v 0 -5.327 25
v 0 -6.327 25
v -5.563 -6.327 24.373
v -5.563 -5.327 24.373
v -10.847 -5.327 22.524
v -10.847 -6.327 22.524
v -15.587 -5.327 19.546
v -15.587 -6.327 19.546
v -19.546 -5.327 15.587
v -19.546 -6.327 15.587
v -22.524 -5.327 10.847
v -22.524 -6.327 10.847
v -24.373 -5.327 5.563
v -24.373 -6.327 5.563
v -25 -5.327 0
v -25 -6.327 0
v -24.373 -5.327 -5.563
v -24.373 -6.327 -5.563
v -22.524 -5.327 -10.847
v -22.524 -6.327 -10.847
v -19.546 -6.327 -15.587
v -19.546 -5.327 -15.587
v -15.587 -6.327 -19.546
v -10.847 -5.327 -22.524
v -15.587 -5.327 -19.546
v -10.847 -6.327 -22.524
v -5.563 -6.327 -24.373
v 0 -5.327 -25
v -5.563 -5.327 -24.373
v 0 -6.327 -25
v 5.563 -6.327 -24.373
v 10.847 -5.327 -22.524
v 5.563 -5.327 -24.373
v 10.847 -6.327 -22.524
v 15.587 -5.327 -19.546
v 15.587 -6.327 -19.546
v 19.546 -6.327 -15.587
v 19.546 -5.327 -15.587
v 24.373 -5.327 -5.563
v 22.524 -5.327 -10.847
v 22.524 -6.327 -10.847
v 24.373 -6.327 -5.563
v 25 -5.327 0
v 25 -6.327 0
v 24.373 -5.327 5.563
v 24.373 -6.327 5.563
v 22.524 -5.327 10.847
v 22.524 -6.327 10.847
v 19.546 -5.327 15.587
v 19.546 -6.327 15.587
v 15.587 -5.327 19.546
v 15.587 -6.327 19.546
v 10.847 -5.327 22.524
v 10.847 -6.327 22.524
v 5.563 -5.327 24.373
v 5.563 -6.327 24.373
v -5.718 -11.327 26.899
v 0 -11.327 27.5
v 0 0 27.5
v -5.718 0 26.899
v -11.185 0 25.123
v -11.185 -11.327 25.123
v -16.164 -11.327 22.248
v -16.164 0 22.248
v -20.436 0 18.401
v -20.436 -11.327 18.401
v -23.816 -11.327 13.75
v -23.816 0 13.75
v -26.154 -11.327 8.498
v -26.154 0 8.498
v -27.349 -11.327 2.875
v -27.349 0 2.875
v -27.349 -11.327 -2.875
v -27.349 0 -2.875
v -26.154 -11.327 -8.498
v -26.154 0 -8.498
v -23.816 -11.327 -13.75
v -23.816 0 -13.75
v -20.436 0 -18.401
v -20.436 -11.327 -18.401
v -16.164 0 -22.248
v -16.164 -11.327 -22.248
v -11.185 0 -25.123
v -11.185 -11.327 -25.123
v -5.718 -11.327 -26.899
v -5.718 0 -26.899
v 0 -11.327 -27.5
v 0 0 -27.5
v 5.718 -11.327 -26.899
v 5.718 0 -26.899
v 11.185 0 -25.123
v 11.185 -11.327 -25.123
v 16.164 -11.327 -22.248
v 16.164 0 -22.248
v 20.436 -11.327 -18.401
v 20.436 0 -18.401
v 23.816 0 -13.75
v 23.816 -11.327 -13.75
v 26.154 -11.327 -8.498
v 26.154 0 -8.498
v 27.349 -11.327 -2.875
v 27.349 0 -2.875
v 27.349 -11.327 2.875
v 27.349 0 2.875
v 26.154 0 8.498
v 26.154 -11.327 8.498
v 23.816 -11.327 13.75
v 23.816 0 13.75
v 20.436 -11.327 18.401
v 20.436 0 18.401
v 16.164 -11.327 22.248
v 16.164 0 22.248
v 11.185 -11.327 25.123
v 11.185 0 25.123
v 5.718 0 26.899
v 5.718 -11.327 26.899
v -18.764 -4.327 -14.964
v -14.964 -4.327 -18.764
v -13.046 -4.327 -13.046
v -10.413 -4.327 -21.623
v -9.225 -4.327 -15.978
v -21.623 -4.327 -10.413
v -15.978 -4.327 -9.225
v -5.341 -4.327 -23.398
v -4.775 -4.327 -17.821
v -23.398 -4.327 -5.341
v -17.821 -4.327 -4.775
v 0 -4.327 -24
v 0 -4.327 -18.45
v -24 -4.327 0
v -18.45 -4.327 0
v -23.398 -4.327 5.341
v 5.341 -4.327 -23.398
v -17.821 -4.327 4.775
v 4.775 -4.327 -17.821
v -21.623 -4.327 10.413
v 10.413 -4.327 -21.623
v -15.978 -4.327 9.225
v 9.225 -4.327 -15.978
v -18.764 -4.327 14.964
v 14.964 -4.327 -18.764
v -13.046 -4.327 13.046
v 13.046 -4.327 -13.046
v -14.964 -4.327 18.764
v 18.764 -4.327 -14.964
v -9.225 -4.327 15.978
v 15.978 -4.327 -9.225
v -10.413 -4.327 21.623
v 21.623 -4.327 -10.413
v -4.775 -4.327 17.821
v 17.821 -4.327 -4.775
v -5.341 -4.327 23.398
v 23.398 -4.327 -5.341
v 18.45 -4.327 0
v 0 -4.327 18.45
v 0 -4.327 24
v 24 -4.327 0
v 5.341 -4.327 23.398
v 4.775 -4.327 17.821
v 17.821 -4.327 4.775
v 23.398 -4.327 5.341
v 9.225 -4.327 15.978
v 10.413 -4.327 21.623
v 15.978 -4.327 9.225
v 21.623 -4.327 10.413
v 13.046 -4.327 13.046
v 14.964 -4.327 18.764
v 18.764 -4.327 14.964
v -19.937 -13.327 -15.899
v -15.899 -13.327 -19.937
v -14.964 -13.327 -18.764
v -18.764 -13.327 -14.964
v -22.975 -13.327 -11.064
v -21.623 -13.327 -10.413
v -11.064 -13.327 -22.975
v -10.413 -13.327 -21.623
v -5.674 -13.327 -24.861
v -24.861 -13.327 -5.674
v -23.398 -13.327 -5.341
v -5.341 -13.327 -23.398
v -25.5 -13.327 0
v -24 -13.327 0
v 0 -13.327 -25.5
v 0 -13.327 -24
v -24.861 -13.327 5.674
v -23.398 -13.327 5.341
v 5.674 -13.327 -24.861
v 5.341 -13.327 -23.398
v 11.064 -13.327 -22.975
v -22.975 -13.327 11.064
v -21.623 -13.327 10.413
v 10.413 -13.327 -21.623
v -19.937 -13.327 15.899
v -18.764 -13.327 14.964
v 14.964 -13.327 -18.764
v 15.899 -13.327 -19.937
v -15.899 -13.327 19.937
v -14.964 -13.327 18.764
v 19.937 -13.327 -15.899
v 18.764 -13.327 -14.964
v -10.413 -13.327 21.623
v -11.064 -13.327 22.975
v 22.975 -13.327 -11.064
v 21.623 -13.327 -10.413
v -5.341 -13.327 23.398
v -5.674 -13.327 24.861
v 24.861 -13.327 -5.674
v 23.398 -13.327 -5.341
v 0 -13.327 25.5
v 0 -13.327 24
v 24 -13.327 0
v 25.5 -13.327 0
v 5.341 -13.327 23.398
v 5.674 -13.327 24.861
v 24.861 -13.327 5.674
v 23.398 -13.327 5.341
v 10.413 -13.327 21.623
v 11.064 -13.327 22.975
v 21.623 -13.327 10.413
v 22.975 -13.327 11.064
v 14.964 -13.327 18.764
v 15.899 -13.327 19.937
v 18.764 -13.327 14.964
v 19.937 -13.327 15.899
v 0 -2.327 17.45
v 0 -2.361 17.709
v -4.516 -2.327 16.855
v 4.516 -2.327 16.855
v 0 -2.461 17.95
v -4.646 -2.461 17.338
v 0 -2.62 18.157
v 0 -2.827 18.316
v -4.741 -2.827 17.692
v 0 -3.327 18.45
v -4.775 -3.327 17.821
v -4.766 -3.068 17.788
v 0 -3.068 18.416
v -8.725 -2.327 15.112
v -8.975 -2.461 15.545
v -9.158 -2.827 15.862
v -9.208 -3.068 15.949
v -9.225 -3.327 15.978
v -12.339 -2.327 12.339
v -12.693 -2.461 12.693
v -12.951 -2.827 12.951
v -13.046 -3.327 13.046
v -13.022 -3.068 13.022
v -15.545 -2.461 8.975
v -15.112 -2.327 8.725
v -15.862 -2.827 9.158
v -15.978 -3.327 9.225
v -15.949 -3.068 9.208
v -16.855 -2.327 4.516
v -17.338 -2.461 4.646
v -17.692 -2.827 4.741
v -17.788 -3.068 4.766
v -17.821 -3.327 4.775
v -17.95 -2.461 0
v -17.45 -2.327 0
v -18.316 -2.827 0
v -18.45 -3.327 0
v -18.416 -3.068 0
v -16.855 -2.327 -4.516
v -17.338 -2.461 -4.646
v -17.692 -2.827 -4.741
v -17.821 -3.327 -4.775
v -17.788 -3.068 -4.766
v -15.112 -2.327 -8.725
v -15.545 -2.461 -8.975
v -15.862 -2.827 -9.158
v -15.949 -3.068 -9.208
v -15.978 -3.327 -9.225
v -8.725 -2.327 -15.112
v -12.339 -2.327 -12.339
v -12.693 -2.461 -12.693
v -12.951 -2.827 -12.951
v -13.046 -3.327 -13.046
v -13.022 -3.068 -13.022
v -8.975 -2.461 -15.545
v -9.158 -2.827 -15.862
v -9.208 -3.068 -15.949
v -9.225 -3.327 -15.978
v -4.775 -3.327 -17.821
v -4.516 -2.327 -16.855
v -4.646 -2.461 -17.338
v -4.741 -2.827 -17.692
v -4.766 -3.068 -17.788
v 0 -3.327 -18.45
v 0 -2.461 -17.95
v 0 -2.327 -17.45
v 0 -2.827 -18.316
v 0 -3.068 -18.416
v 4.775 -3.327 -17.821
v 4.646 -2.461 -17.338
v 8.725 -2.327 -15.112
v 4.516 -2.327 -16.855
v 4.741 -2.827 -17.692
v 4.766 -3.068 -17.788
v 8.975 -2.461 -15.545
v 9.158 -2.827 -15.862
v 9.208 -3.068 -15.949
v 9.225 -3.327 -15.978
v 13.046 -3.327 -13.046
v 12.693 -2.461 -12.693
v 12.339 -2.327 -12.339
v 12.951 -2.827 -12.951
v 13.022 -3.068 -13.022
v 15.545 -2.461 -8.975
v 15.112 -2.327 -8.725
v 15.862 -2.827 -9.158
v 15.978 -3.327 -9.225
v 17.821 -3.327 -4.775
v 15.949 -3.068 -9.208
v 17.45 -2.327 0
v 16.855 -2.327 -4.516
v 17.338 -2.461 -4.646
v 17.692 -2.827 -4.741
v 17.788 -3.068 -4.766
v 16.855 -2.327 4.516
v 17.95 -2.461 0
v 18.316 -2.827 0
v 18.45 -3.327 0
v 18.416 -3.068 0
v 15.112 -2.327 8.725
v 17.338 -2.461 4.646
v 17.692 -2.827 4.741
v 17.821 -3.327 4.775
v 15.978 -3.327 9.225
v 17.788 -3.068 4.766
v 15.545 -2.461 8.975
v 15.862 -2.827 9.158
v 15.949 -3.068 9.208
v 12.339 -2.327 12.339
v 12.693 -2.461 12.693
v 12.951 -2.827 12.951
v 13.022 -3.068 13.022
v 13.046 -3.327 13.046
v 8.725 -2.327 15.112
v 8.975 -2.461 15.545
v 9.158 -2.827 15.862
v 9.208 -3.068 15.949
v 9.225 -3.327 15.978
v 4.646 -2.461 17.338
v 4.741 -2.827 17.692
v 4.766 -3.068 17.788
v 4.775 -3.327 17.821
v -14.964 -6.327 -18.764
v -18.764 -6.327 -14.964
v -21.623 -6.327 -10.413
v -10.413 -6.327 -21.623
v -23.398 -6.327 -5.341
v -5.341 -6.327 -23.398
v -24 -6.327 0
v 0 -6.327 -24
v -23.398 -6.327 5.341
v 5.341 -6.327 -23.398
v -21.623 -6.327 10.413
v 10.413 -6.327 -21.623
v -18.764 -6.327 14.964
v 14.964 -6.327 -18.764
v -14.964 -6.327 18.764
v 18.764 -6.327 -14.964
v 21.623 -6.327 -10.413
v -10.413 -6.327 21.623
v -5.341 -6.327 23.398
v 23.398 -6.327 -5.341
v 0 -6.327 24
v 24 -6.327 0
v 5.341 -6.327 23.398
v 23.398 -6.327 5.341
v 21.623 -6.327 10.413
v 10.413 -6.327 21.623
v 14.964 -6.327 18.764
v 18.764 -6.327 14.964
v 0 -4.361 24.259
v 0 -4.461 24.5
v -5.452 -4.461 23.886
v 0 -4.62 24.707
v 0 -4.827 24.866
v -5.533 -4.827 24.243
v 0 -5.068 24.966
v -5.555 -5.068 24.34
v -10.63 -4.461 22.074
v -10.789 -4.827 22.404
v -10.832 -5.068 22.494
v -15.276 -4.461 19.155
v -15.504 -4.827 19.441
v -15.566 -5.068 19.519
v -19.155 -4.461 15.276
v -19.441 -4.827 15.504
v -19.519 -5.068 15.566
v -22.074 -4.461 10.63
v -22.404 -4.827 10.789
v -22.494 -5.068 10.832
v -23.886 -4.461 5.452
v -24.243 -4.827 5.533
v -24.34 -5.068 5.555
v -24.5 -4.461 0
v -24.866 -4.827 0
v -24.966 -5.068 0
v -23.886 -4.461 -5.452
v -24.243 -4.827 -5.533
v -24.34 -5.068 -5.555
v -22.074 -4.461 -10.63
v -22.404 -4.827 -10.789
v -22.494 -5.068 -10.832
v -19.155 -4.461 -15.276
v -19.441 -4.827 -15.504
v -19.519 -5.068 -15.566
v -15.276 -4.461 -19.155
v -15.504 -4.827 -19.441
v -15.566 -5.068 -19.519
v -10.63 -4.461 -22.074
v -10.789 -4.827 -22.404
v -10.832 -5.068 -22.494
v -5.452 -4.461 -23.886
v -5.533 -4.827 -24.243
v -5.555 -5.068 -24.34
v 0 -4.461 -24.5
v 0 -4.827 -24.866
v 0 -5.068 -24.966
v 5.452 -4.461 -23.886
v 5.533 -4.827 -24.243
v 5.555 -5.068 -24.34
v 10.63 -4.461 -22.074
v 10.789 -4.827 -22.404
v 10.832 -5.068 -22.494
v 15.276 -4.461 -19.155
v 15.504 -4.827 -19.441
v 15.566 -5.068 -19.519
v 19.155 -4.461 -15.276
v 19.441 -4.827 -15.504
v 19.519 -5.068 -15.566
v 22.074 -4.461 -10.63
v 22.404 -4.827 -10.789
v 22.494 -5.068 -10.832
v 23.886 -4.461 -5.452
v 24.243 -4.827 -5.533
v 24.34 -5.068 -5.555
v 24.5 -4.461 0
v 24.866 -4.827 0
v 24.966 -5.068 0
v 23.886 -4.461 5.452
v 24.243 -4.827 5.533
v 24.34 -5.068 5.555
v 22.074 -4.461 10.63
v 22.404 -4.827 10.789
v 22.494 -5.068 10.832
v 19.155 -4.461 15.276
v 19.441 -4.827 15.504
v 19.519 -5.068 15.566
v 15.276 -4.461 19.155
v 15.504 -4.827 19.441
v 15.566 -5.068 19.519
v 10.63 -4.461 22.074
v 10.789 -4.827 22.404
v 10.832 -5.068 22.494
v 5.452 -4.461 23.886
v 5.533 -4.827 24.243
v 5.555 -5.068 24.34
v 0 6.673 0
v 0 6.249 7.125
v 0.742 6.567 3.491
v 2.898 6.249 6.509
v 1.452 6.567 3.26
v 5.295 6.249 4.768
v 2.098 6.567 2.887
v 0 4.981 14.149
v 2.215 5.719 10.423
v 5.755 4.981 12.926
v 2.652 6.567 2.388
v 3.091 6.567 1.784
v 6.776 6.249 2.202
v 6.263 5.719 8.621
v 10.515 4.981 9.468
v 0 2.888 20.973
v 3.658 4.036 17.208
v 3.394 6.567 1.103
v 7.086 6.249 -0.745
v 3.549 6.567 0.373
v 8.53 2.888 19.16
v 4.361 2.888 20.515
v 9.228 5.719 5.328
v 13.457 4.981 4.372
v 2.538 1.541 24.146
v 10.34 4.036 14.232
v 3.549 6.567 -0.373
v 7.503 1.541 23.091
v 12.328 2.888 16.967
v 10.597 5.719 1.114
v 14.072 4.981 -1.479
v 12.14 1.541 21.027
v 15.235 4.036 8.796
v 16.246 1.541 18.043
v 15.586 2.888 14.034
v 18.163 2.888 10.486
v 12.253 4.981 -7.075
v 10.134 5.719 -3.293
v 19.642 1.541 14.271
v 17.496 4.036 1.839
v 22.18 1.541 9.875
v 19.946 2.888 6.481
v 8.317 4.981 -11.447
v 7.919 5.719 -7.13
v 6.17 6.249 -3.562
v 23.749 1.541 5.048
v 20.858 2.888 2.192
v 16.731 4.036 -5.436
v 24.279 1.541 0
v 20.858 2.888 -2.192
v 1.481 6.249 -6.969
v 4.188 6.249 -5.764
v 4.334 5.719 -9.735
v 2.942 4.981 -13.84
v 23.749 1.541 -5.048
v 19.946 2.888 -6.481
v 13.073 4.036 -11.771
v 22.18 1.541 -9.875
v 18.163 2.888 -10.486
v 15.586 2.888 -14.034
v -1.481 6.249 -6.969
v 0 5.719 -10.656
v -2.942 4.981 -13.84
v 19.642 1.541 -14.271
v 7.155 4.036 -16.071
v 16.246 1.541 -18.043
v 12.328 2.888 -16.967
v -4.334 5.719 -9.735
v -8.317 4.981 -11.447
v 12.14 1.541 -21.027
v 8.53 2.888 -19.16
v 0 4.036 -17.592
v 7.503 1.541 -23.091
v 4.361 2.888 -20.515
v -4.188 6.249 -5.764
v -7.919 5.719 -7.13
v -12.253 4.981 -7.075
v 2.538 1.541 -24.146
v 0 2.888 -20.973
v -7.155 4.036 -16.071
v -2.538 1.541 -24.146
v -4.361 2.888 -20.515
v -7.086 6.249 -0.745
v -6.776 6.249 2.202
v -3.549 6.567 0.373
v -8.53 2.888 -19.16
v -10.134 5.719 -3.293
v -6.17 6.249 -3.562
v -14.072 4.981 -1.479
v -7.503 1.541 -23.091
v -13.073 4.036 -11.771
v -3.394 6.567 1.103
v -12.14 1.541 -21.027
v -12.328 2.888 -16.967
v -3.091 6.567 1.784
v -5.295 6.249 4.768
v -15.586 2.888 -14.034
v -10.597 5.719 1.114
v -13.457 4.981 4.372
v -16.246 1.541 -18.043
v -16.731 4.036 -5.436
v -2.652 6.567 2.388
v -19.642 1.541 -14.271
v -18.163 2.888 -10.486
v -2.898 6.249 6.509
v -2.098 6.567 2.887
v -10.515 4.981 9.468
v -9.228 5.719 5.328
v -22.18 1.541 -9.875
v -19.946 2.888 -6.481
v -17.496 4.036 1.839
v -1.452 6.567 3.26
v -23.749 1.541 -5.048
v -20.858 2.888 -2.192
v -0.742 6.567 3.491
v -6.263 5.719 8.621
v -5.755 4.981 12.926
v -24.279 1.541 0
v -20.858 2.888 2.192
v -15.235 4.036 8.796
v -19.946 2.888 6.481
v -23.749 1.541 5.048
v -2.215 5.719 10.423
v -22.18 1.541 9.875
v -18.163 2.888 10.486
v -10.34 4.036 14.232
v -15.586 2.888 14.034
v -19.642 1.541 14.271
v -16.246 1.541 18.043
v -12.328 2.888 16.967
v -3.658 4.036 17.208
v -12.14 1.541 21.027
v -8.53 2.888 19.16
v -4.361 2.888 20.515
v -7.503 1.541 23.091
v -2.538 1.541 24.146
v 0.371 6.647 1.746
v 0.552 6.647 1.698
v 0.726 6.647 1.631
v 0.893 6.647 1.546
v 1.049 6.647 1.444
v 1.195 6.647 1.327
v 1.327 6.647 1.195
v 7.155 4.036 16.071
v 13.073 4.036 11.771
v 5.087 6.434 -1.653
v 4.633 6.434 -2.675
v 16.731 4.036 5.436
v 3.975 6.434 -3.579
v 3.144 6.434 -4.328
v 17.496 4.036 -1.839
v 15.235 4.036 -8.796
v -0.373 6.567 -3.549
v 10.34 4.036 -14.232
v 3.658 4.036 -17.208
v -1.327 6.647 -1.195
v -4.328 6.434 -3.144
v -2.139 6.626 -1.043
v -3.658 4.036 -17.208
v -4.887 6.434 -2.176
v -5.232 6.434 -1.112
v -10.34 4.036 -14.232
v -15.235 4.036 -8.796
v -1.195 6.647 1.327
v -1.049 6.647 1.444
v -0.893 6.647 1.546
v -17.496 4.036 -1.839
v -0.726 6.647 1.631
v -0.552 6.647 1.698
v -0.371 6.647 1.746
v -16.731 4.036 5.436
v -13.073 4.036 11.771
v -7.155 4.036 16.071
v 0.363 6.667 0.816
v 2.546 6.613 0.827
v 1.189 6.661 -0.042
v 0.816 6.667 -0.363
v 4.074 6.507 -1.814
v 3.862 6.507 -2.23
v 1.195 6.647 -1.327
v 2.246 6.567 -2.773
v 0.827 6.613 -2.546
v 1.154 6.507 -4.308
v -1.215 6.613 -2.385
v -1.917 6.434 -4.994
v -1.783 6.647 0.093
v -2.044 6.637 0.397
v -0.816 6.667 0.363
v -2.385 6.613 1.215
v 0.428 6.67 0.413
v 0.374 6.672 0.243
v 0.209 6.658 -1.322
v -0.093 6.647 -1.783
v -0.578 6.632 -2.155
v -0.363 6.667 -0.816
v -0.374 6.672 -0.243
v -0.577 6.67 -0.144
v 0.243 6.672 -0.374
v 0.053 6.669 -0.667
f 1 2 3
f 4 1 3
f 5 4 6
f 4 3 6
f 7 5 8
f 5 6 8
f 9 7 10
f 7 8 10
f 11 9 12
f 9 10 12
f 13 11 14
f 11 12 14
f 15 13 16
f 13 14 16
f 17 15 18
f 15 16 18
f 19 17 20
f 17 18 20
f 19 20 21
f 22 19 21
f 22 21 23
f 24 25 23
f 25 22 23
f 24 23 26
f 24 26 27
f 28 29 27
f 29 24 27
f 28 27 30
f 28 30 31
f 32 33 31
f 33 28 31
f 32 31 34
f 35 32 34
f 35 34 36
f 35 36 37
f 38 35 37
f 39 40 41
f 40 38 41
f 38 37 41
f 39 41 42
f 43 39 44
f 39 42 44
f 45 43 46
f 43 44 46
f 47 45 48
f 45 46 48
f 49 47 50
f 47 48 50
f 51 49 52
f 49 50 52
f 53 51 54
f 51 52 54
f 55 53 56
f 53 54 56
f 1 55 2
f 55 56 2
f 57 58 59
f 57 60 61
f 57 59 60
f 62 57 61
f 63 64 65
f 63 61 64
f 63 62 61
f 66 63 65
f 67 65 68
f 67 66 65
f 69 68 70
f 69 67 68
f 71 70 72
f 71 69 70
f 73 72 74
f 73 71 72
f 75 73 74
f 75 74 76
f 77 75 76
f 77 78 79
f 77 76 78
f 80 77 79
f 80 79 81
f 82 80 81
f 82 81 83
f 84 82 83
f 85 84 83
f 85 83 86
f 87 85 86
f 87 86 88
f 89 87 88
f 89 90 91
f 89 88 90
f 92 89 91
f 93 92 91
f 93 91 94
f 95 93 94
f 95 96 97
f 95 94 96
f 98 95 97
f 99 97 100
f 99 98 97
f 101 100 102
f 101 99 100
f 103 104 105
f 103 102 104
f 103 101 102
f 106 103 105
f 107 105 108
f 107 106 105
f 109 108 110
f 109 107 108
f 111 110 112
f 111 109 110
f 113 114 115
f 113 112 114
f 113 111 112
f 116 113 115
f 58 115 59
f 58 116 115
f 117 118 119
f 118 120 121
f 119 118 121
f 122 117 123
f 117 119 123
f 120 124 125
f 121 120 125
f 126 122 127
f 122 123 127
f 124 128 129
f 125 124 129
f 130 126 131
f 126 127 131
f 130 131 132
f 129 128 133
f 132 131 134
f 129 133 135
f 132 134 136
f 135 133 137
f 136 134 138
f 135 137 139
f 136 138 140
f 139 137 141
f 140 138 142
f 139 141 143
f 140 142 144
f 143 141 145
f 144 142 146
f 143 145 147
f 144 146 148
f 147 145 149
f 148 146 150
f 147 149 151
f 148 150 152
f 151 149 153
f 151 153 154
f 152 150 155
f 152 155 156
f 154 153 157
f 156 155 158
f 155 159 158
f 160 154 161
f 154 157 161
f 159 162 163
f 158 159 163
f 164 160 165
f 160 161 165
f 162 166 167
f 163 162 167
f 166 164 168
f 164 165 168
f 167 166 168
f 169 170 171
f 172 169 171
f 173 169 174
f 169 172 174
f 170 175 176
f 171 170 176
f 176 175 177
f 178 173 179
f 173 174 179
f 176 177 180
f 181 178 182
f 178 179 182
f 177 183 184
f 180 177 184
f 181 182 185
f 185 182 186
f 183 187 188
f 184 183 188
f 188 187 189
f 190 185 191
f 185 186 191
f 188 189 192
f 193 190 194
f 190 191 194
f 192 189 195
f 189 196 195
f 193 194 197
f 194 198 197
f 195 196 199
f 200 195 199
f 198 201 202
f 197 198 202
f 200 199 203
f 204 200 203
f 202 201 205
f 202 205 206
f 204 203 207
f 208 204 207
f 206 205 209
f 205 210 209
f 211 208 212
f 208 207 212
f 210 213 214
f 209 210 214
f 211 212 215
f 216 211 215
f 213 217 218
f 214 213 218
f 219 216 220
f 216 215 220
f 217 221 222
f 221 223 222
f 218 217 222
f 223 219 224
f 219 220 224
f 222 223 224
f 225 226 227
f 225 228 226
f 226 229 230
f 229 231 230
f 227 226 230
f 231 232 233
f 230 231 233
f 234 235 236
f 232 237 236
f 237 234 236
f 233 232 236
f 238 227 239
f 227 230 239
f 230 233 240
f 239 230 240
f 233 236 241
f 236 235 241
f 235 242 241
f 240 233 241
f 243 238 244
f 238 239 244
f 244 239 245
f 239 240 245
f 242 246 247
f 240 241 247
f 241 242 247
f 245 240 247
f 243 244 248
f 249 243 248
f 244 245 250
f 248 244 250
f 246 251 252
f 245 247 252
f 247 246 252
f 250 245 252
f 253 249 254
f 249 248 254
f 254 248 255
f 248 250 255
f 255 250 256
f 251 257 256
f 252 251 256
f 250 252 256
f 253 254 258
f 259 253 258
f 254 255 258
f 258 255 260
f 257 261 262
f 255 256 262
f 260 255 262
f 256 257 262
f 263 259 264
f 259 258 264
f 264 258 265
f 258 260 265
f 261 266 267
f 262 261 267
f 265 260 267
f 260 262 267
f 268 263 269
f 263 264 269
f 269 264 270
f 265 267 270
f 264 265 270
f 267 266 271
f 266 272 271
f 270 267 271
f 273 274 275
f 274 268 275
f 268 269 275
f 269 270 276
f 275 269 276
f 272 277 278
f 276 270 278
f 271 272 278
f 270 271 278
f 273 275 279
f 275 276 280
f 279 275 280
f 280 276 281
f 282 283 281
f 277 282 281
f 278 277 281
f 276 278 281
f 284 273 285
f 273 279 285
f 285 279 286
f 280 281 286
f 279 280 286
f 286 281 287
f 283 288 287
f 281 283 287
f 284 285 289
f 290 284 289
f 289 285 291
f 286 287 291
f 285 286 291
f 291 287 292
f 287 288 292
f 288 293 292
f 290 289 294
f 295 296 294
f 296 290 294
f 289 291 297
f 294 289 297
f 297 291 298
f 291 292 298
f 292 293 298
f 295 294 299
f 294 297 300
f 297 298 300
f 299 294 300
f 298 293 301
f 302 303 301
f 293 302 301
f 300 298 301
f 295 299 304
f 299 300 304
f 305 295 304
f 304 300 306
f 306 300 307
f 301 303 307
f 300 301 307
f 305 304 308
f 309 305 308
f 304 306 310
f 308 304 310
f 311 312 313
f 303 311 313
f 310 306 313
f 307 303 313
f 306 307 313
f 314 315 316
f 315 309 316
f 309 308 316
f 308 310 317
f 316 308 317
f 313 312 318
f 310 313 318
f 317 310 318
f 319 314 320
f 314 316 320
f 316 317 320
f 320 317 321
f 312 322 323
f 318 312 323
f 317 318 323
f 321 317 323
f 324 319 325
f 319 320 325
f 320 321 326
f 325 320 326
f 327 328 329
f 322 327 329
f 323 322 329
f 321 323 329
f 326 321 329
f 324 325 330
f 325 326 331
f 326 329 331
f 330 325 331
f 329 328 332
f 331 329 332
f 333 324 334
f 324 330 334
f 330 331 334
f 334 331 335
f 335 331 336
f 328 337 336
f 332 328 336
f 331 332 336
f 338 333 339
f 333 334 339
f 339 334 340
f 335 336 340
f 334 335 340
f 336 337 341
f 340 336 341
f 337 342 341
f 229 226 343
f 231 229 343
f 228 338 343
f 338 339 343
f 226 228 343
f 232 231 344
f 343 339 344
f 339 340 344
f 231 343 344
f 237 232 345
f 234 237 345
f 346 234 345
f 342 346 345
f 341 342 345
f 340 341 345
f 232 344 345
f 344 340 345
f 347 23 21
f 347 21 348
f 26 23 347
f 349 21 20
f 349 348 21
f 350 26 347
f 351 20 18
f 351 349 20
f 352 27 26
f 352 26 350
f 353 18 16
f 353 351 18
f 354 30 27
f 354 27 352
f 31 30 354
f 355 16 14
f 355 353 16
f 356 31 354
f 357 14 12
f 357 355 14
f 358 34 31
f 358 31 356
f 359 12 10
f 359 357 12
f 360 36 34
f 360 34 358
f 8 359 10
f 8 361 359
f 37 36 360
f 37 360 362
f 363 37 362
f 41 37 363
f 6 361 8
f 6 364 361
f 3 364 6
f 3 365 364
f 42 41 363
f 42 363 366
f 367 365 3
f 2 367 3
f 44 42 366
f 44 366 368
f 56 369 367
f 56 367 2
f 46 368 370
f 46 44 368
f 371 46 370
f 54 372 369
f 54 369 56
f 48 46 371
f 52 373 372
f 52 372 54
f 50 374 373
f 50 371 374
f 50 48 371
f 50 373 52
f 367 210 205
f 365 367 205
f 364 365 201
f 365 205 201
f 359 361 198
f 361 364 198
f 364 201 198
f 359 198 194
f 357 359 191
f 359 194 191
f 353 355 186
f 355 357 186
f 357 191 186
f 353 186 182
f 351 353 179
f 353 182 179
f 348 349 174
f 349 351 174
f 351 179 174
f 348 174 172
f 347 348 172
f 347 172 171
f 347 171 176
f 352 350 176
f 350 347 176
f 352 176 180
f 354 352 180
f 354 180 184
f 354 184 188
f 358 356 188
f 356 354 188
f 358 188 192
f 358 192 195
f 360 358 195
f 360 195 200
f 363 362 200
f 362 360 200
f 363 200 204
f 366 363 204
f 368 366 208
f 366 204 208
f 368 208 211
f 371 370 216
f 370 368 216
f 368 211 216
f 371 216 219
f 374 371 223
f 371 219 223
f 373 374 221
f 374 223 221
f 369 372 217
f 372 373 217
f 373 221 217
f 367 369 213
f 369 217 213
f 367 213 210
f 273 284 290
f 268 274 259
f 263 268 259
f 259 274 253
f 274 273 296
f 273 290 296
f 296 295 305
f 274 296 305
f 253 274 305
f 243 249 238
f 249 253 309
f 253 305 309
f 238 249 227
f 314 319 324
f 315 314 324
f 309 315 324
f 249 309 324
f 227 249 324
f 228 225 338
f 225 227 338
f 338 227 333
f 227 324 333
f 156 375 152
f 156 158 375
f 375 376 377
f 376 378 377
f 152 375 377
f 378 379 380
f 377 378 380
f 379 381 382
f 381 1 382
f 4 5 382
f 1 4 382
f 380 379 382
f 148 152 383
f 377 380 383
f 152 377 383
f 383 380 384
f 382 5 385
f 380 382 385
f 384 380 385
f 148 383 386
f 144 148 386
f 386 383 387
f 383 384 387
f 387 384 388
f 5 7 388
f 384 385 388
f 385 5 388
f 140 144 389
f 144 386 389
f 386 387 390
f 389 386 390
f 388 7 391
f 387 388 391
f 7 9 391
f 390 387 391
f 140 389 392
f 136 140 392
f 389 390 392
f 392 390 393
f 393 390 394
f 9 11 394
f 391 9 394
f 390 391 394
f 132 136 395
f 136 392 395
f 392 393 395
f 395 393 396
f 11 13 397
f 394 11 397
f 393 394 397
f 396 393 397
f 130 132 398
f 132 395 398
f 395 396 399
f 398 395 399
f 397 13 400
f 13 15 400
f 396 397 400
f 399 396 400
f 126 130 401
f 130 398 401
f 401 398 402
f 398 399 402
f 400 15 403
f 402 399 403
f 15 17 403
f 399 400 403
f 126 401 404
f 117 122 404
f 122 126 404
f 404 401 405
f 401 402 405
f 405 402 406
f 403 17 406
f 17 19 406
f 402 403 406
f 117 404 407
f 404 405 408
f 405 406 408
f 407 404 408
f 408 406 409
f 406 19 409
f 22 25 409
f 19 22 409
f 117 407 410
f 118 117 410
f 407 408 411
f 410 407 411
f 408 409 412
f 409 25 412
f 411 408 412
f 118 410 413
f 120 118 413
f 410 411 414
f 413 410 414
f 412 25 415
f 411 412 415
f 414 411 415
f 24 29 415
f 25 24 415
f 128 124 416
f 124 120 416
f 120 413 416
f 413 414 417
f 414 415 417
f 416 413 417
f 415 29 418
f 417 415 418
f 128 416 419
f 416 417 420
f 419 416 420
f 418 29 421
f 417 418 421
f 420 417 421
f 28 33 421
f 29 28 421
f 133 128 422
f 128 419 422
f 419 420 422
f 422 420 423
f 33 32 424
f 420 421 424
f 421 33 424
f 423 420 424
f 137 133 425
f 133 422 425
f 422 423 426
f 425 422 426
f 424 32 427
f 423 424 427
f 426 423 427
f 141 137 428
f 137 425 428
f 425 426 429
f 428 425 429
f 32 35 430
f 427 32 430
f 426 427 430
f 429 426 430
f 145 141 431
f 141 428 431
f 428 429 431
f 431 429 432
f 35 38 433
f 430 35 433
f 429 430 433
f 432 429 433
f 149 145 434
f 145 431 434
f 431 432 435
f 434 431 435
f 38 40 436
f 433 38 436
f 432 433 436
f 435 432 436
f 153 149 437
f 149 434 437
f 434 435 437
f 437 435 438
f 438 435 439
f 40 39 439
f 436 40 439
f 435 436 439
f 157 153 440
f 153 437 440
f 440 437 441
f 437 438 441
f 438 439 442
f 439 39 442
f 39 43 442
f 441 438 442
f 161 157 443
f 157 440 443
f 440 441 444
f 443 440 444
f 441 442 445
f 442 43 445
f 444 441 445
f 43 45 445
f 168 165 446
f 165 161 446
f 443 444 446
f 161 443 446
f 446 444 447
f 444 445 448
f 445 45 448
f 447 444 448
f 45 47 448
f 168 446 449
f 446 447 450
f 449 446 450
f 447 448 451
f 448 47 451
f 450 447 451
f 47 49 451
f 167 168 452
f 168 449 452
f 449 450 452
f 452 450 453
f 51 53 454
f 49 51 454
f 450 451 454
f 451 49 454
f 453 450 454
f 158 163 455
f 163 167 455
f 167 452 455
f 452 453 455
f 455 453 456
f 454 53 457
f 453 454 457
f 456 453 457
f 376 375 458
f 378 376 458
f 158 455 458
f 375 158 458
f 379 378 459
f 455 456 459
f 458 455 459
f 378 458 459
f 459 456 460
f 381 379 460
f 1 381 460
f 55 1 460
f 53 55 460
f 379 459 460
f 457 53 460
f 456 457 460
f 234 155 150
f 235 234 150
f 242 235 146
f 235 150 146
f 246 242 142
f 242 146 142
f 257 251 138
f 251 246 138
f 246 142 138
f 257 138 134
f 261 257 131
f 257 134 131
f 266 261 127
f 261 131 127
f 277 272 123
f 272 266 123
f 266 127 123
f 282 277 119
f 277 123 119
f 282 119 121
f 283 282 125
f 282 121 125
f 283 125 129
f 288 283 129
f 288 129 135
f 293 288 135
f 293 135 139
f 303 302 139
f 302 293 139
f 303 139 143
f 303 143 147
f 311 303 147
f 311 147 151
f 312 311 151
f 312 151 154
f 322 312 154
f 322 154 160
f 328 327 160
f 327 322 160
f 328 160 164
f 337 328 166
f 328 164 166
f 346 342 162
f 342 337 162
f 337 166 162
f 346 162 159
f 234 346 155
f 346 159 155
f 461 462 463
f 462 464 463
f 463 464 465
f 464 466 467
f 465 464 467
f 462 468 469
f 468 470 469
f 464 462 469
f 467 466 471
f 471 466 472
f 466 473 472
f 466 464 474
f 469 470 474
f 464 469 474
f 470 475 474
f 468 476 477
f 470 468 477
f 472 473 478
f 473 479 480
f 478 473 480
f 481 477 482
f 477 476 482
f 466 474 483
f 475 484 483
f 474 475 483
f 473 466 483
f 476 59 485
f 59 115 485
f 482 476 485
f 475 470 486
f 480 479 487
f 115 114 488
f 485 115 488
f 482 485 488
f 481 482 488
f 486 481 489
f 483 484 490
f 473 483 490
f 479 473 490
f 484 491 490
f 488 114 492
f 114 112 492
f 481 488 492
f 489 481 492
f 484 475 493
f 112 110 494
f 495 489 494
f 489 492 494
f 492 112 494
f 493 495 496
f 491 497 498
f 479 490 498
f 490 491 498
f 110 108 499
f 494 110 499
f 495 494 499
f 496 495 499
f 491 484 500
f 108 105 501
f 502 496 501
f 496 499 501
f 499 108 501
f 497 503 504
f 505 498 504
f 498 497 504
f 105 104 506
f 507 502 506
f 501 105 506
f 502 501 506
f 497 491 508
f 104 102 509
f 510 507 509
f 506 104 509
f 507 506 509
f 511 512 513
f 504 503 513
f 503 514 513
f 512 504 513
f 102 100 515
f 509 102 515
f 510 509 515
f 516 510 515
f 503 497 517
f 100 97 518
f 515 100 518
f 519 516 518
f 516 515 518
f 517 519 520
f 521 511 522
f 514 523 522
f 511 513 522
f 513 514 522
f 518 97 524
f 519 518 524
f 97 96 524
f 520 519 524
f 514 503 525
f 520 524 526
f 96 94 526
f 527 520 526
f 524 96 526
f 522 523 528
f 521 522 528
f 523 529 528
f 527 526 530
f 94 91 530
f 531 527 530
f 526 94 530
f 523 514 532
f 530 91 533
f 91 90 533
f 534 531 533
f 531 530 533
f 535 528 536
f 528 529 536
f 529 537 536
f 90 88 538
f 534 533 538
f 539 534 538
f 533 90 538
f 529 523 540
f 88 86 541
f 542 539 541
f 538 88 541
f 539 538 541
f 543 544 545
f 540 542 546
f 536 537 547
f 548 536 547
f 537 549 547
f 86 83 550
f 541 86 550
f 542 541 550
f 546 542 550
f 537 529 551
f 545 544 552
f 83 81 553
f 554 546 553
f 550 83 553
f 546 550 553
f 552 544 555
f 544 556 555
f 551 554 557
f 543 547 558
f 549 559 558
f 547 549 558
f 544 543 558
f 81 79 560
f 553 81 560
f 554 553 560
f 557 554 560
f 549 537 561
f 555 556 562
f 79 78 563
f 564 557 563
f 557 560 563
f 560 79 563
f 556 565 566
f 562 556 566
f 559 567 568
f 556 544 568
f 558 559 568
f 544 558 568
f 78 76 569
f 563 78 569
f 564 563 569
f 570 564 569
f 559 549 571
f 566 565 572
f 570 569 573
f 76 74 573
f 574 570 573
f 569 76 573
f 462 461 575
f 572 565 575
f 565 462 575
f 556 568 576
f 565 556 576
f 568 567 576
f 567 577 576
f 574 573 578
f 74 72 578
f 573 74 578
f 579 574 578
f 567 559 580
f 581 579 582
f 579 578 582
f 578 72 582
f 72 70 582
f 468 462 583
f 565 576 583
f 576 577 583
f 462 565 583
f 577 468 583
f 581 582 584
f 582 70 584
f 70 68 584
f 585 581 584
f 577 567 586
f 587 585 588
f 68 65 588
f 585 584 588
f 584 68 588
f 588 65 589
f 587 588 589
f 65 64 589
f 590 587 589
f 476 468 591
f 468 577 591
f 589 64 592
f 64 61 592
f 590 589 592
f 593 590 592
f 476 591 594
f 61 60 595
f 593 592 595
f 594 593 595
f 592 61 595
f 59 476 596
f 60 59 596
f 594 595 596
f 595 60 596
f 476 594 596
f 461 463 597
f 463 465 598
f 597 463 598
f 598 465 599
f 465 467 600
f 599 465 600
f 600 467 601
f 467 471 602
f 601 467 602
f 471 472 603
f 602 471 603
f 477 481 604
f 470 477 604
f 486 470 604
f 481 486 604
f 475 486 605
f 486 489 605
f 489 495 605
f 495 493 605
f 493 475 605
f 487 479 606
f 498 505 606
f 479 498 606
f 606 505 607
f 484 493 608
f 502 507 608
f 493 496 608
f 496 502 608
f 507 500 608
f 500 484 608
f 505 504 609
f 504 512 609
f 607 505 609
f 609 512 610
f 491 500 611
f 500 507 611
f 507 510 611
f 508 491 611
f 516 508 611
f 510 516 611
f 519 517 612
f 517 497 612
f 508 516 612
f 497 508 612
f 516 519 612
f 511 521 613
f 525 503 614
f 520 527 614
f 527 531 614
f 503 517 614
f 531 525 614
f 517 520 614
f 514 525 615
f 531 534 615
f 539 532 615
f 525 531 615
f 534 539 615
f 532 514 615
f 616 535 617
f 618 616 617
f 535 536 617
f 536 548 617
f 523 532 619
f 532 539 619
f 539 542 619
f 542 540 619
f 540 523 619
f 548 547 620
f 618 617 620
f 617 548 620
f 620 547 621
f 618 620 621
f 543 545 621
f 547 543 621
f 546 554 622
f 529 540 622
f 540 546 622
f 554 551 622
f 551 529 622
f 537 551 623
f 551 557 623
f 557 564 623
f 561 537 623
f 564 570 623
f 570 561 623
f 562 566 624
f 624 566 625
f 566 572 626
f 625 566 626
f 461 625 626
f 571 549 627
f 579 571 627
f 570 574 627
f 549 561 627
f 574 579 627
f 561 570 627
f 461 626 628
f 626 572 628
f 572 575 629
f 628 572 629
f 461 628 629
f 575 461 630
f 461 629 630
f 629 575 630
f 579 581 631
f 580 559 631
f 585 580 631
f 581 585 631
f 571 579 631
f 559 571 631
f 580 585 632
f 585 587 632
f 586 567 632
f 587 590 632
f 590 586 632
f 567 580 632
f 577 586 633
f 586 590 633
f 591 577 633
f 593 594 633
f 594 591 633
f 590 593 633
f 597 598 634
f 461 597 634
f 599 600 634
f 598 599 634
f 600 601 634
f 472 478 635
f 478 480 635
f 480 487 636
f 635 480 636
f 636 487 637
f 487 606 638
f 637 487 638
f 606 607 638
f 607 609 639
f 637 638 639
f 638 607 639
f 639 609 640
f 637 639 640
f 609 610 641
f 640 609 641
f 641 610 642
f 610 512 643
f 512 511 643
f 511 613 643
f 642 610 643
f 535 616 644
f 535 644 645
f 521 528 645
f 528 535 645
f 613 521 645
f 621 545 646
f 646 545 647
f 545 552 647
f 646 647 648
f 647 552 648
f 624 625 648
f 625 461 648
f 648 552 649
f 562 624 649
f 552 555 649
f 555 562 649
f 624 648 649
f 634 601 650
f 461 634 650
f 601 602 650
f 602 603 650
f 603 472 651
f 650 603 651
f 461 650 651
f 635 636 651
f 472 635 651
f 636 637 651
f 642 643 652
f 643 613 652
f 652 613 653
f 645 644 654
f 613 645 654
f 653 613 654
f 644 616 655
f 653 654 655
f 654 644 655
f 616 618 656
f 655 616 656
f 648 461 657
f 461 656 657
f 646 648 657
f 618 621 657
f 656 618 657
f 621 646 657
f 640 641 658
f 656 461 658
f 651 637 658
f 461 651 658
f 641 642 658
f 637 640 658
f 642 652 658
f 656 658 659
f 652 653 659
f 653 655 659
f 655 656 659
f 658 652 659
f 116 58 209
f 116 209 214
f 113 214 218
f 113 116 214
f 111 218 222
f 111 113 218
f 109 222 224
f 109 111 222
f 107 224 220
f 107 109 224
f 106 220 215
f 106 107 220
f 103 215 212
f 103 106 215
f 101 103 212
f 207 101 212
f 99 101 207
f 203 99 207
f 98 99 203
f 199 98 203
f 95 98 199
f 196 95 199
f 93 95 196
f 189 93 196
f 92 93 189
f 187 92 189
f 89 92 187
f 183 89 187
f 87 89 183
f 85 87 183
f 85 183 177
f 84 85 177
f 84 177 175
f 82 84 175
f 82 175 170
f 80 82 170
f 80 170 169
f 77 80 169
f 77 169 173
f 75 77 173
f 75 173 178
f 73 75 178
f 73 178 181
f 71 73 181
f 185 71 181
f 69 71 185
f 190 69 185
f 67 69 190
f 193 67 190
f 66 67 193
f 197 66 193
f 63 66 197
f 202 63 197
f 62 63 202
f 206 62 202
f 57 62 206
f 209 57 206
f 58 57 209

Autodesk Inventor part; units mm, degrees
ref_plane "YZ Plane" through (0, 0, 0) normal (1, 0, 0) x (0, 1, 0)
ref_plane "XZ Plane" through (0, 0, 0) normal (0, 1, 0) x (-1, 0, 0)
ref_plane "XY Plane" through (0, 0, 0) normal (0, 0, 1) x (1, 0, 0)
sketch "草图2" plane through (0, 0, 0) normal (1, 0, 0) x (0, 1, 0)
  line L0 (0, 27.5) -> (-11.3268, 27.5)
  line L1 (-11.3268, 27.5) -> (-13.3268, 25.5)
  line L2 (-13.3268, 25.5) -> (-13.3268, 0)
  line L3 (-13.3268, 0) -> (6.6732, 0)
  arc A0 (6.6732, 0) -> (0, 27.5) centre (-53.3268, 0) ccw
  line L4 (-2.3268, 0) -> (-2.3268, 17.45)
  line L5 (-3.3268, 18.45) -> (-4.3268, 18.45)
  line L6 (-4.3268, 18.45) -> (-4.3268, 24)
  line L7 (-5.3268, 25) -> (-6.3268, 25)
  line L8 (-6.3268, 25) -> (-6.3268, 24)
  line L9 (-6.3268, 24) -> (-13.3268, 24)
  arc A1 (-2.3268, 17.45) -> (-3.3268, 18.45) centre (-3.3268, 17.45) ccw
  arc A2 (-4.3268, 24) -> (-5.3268, 25) centre (-5.3268, 24) ccw
  point P0 (0, 0)
  dimension "d0" = 45
  dimension "d5" = 2
  dimension "d6" = 27.5
  dimension "d7" = 20
  dimension "d8" = 60
  dimension "d10" = 1
  dimension "d11" = 1
  dimension "d12" = 2
  dimension "d13" = 2
  dimension "d14" = 7
  dimension "d15" = 18.45
  dimension "d16" = 24
revolve "旋转1" add sketch "草图2" angle 360 about axis through (0, -13.3268, 0) along (0, 1, 0) contours A0 L3 L4 A1 L5 L6 A2 L7 L8 L9 L2 L1 L0
thread "螺纹1" size "M48x1.5" class "6H" standard "GB Metric profile" length 20
equation "\"d6\" = 0.5 * D"
equation "\"d7\" = c_"
equation "\"d8\" = R"
equation "\"d12\" = e"
equation "\"d13\" = f_"
equation "\"d14\" = K_"
equation "\"d15\" = 0.5 * D1"
equation "\"d16\" = 0.5 * d1"
equation "\"d\" = 24"
equation "\"d1\" = 48"
equation "\"d2\" = 12"
equation "\"d3\" = 5"
equation "\"d4\" = 22"
equation "\"D\" = 55"
equation "\"a\" = 15"
equation "\"b\" = 8"
equation "\"c_\" = 20"
equation "\"h1\" = 22"
equation "\"R\" = 60"
equation "\"D1\" = 36.9"
equation "\"S_\" = 32"
equation "\"K_\" = 7"
equation "\"e\" = 2"
equation "\"f_\" = 2"
properties part number "通气器盖子" material "钢，软"
